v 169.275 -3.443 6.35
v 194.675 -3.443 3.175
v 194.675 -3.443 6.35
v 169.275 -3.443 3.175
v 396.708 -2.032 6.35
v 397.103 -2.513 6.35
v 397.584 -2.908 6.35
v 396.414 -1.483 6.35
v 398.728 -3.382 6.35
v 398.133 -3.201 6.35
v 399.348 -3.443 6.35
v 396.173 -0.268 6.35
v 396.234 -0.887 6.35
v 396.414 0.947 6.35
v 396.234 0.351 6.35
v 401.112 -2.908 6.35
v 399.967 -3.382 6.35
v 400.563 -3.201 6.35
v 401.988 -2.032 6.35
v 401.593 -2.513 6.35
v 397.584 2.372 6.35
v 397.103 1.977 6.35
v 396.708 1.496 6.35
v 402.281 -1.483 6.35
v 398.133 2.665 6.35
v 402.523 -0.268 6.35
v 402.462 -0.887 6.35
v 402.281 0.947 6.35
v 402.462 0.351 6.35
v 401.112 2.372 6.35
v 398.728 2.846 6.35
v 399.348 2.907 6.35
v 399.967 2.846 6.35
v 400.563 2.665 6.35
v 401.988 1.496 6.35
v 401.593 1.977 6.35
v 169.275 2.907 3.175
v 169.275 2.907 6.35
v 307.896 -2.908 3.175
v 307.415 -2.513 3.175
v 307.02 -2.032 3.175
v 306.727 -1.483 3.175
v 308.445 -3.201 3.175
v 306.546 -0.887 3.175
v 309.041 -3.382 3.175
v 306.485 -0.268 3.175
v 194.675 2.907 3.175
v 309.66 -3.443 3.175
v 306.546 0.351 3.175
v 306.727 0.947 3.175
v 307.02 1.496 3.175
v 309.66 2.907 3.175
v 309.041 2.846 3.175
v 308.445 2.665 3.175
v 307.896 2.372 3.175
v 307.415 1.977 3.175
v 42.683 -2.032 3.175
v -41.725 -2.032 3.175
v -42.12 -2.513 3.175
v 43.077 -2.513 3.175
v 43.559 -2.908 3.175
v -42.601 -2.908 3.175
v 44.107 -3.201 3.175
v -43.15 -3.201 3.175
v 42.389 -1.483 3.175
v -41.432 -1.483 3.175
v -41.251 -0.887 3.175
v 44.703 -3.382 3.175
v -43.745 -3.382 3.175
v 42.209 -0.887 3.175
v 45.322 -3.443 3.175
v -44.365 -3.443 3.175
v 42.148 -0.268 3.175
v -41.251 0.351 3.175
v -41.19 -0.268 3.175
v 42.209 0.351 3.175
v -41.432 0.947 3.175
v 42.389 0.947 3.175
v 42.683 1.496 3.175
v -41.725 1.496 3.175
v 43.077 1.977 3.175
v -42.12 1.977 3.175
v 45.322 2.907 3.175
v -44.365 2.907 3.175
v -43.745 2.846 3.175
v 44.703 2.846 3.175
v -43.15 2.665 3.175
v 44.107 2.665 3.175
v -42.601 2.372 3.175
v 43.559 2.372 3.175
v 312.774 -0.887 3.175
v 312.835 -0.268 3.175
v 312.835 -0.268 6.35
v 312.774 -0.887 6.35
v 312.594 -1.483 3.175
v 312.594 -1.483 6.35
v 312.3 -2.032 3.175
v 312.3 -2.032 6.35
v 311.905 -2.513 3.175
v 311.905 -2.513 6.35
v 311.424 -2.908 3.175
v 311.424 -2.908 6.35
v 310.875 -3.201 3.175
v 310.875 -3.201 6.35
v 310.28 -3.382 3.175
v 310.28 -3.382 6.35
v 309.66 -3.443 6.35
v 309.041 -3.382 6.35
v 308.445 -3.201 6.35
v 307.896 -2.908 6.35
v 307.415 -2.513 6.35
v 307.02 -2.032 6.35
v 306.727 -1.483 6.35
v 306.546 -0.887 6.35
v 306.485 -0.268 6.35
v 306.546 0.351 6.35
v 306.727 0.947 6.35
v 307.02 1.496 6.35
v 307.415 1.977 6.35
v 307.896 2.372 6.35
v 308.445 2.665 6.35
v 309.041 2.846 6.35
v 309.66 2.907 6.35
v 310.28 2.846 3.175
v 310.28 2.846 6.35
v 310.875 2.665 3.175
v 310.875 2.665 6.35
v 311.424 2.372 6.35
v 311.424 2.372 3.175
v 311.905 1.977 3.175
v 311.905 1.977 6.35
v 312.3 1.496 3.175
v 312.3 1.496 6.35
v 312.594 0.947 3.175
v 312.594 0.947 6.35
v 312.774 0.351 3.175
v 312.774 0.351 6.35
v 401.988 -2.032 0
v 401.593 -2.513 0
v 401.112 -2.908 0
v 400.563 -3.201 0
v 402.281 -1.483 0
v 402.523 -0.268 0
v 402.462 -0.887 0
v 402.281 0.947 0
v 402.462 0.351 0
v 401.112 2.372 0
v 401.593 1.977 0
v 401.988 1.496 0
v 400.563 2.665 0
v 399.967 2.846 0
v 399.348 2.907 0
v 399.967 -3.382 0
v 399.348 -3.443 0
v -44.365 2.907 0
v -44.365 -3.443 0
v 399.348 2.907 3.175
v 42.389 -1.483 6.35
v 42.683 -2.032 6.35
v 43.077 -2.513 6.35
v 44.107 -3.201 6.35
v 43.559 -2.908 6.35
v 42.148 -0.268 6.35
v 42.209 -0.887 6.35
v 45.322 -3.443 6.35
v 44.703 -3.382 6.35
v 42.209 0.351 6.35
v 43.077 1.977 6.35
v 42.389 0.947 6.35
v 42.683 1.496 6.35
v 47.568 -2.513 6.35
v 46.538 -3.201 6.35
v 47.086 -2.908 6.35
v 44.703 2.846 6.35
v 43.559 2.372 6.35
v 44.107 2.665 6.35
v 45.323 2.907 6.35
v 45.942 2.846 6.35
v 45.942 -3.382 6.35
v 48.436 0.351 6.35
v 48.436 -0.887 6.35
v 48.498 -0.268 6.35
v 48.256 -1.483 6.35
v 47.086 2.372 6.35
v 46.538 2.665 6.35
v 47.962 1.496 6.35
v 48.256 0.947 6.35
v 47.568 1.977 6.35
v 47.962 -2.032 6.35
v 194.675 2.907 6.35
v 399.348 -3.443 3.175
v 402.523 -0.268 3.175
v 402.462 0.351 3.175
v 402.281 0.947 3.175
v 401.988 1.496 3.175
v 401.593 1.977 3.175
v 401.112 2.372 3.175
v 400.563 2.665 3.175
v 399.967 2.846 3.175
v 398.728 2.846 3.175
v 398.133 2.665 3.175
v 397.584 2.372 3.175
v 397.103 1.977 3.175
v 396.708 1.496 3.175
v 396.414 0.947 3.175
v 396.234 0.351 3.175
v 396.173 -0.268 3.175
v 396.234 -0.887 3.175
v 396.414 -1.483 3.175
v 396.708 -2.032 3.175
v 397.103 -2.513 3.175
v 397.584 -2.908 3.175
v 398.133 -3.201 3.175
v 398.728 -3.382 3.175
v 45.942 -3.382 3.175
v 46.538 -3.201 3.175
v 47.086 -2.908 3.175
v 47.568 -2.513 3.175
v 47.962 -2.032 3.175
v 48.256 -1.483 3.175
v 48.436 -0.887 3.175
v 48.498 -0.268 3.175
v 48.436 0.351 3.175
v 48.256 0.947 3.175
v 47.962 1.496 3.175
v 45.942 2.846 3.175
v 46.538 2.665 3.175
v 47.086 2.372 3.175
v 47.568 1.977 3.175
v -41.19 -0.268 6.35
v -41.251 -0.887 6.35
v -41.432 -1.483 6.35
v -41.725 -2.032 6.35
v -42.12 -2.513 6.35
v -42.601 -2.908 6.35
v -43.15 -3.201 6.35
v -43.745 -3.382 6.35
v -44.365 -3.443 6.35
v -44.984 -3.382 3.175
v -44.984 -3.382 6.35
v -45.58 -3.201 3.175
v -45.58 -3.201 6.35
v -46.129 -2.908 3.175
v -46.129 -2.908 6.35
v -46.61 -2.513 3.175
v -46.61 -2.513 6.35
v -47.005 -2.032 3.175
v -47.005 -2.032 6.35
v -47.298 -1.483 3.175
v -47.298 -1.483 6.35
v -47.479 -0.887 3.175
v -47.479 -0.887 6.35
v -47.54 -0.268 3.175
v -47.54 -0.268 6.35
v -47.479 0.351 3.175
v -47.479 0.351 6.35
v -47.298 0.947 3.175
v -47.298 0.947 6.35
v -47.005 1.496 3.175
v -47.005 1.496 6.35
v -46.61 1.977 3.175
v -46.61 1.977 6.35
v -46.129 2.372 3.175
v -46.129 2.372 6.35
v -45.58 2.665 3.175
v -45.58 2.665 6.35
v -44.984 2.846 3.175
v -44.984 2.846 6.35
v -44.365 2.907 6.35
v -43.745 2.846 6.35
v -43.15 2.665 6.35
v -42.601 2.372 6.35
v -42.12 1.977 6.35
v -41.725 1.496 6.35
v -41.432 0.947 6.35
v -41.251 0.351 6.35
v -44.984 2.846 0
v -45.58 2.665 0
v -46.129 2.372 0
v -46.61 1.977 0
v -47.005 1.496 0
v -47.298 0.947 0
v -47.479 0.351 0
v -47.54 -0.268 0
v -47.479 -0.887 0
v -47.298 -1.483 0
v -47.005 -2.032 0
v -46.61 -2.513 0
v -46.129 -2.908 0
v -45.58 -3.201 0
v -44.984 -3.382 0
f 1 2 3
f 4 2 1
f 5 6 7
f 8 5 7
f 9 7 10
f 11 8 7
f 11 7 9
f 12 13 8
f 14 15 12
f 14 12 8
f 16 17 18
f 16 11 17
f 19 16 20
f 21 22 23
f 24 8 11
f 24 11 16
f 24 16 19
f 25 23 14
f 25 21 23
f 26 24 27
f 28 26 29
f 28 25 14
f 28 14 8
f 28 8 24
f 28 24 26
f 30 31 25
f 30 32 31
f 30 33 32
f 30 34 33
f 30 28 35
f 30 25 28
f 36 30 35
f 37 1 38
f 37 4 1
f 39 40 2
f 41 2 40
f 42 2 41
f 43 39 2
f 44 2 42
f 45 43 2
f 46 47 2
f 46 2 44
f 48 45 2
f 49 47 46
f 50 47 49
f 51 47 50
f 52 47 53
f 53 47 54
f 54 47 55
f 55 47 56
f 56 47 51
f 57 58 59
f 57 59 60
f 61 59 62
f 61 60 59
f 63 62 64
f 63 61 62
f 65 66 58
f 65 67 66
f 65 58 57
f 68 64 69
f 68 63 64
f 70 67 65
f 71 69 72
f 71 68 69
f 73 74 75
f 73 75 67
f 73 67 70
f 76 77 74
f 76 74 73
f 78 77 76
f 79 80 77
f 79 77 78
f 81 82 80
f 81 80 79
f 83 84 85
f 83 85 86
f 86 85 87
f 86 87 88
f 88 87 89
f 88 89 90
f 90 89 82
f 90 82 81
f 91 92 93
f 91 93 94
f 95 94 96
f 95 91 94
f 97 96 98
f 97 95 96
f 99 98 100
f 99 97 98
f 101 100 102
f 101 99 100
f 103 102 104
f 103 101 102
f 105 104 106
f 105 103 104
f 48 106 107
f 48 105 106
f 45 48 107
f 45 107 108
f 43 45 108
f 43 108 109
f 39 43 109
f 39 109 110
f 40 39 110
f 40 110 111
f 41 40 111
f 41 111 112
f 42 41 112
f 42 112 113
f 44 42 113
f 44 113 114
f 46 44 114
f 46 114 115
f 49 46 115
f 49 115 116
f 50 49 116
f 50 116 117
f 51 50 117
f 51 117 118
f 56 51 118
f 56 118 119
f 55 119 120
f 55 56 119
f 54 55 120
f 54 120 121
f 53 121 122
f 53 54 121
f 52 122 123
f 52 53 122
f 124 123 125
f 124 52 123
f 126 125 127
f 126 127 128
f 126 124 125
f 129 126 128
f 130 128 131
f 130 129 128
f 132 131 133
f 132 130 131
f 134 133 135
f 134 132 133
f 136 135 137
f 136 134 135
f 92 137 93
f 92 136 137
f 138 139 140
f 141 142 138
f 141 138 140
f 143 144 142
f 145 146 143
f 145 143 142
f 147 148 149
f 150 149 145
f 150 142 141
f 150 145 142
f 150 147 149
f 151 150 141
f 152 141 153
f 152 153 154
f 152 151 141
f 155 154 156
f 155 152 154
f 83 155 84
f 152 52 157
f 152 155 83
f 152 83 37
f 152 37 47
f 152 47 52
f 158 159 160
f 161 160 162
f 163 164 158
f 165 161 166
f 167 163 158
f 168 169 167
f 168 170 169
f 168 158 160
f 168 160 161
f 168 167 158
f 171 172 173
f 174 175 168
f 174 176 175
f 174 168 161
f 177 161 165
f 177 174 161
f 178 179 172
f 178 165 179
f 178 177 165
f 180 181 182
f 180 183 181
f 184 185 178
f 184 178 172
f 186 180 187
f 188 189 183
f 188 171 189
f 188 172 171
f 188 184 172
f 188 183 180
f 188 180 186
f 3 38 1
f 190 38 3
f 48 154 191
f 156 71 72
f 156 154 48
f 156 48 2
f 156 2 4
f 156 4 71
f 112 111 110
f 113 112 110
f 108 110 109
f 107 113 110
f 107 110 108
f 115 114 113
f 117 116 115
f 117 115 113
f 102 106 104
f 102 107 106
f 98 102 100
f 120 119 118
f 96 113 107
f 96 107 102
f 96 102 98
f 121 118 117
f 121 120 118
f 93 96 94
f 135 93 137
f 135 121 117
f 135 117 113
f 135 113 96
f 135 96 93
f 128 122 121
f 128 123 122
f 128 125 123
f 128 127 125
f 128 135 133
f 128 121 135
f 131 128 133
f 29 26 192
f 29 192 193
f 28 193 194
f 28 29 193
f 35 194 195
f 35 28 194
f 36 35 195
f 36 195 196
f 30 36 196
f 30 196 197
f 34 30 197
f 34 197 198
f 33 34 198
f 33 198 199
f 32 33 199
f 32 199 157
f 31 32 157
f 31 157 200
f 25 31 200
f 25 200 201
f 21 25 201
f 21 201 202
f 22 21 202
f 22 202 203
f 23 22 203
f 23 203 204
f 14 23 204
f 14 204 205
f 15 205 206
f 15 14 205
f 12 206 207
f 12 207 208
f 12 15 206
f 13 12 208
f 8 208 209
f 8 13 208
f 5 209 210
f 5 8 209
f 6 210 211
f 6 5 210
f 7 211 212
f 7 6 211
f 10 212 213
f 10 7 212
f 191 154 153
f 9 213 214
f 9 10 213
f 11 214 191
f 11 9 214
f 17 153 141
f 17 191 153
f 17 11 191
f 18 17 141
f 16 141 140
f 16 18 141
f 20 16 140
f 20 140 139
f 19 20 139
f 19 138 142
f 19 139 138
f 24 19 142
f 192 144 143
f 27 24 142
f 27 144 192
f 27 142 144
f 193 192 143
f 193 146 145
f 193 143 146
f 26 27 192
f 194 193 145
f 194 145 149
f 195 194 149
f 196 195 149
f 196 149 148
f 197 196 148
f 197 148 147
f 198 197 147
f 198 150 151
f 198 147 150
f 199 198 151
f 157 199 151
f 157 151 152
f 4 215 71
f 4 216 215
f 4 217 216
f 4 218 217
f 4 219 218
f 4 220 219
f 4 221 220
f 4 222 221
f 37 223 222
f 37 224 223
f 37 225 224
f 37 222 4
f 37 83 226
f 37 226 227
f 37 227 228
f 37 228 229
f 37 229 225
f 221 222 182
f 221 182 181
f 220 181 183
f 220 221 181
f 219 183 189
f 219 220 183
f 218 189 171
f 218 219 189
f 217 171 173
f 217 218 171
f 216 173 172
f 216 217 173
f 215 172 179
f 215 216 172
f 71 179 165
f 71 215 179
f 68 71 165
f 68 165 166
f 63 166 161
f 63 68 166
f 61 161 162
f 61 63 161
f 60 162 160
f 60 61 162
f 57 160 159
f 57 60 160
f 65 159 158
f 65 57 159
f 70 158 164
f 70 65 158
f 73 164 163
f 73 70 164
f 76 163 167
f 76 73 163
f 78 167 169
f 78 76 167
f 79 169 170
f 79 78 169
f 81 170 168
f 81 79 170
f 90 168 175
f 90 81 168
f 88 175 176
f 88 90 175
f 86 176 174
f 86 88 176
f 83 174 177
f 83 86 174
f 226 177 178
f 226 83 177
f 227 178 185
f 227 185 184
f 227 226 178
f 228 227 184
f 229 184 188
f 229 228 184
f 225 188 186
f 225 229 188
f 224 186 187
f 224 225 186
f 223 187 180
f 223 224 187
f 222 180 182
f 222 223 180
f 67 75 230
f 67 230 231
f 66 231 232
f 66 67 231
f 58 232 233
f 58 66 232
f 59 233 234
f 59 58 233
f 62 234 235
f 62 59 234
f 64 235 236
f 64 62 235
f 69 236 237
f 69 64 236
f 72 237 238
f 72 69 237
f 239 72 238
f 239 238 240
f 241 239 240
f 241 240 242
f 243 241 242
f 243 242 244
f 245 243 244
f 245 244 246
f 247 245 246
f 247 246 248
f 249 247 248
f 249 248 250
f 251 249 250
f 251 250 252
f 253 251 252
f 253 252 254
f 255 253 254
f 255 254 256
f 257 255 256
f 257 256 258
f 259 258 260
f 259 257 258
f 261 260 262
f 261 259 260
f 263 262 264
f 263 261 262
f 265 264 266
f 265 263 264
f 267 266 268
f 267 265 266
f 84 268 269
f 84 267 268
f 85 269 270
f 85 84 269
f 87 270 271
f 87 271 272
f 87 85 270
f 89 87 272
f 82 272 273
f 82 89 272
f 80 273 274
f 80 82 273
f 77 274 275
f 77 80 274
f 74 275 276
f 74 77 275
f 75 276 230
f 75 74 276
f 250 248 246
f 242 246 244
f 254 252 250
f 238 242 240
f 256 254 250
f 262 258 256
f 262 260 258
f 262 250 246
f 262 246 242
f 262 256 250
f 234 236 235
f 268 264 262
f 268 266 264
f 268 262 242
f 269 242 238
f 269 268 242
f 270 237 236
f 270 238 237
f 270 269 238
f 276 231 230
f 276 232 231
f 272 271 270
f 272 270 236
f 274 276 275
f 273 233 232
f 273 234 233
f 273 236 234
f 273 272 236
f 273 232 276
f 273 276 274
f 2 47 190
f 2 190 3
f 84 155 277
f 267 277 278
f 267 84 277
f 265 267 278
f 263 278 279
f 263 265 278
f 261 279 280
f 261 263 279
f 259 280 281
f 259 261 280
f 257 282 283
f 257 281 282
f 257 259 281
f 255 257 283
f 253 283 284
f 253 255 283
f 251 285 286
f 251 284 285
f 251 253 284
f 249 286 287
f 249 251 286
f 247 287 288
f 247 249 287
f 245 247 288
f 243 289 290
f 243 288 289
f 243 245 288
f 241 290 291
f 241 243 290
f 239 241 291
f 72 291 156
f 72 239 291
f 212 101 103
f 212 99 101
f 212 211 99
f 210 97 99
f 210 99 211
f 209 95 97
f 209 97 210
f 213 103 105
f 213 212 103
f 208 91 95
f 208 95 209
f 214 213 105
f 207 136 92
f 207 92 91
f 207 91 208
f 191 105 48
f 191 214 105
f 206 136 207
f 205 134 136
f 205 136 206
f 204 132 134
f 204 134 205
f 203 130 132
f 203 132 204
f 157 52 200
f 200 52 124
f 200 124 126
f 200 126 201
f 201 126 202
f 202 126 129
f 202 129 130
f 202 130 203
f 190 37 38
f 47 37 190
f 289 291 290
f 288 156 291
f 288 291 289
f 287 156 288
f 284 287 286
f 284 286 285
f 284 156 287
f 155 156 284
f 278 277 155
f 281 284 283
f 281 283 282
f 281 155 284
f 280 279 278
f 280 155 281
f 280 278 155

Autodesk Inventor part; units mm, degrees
ref_plane "YZ Plane" through (0, 0, 0) normal (1, 0, 0) x (0, 1, 0)
ref_plane "XZ Plane" through (0, 0, 0) normal (0, 1, 0) x (-1, 0, 0)
ref_plane "XY Plane" through (0, 0, 0) normal (0, 0, 1) x (1, 0, 0)
sketch "Sketch1" plane through (0, 0, 0) normal (0, 0, 1) x (1, 0, 0)
  line L0 (-44.3649, 2.907) -> (399.3477, 2.907)
  line L1 (399.3477, 2.907) -> (399.3477, -3.443)
  line L2 (399.3477, -3.443) -> (-44.3649, -3.443)
  line L3 (-44.3649, -3.443) -> (-44.3649, 2.907)
  point P0 (0, 0)
  dimension "d0" = 443.7126
  dimension "d1" = 6.35
extrude "Extrusion1" add sketch "Sketch1" along normal blind 3.175
sketch "Sketch2" plane through (0, 0, 3.175) normal (0, 0, 1) x (1, 0, 0)
  line L0 (399.3477, 2.907) -> (399.3477, -3.443) projected
  line L1 (-44.3649, 2.907) -> (399.3477, 2.907) projected
  line L2 (-44.3649, -3.443) -> (-44.3649, 2.907) projected
  line L3 (-44.3649, 2.907) -> (-44.3649, -0.268)
  line L4 (-44.3649, -0.268) -> (399.3477, -0.268)
  line L5 (399.3477, -0.268) -> (309.6603, -0.268)
  line L6 (-44.3649, -0.268) -> (45.3225, -0.268)
  circle A0 centre (-44.3649, -0.268) radius 3.175
  circle A1 centre (45.3225, -0.268) radius 3.175
  circle A2 centre (309.6603, -0.268) radius 3.175
  circle A3 centre (399.3477, -0.268) radius 3.175
  point P0 (0, 0)
  dimension "d4" = 3.175
  dimension "d5" = 89.6874
  dimension "d6" = 89.6874
extrude "Extrusion2" add sketch "Sketch2" along normal blind 3.175 contours A3 L0 | L0 L4 A3 | L0 A3 L4 | A2 L4 | A1 L4 | A2 L4 | A0 L4 L2 | L2 A0 | A1 L4 | L4 A0 L2
sketch "Sketch3" plane through (0, 0, 3.175) normal (0, 0, -1) x (-1, 0, 0)
  line L0 (-399.3477, 2.907) -> (-399.3477, -3.443) projected
  arc A0 (-399.3477, 2.907) -> (-399.3477, -3.443) centre (-399.3477, -0.268) ccw projected
  point P0 (0, 0)
extrude "Extrusion3" add sketch "Sketch3" along normal blind 3.175
sketch "Sketch4" plane through (0, 0, 3.175) normal (0, 0, -1) x (-1, 0, 0)
  line L0 (44.3649, -3.443) -> (44.3649, 2.907) projected
  arc A0 (44.3649, -3.443) -> (44.3649, 2.907) centre (44.3649, -0.268) ccw projected
  point P0 (0, 0)
extrude "Extrusion4" add sketch "Sketch4" along normal blind 3.175
sketch "Sketch5" plane through (0, 0, 3.175) normal (0, 0, 1) x (1, 0, 0)
  arc A0 (45.3225, -3.443) -> (45.3225, 2.907) centre (45.3225, -0.268) ccw projected
  line L0 (309.6603, -3.443) -> (45.3225, -3.443) projected
  arc A1 (309.6603, 2.907) -> (309.6603, -3.443) centre (309.6603, -0.268) ccw projected
  line L1 (45.3225, 2.907) -> (309.6603, 2.907) projected
  line L2 (309.6603, -3.443) -> (45.3225, 2.907)
  line L3 (45.3225, -3.443) -> (309.6603, 2.907)
  line L4 (177.4914, -0.268) -> (177.4914, -3.443)
  line L5 (181.9749, -3.443) -> (194.6749, -3.443)
  line L6 (194.6749, -3.443) -> (169.2749, -3.443)
  line L7 (169.2749, -3.443) -> (169.2749, 2.907)
  line L8 (169.2749, 2.907) -> (194.6749, 2.907)
  line L9 (194.6749, 2.907) -> (194.6749, -3.443)
  point P0 (0, 0)
  dimension "d13" = 12.7
  dimension "d14" = 25.4
extrude "Extrusion5" add sketch "Sketch5" along normal blind 3.175 contours L7 L3 L4 L0 | L7 L2 L3 | L1 L9 L3 L2 L7 | L4 L2 L9 L0 | L3 L9 L2
properties part number "connection"
